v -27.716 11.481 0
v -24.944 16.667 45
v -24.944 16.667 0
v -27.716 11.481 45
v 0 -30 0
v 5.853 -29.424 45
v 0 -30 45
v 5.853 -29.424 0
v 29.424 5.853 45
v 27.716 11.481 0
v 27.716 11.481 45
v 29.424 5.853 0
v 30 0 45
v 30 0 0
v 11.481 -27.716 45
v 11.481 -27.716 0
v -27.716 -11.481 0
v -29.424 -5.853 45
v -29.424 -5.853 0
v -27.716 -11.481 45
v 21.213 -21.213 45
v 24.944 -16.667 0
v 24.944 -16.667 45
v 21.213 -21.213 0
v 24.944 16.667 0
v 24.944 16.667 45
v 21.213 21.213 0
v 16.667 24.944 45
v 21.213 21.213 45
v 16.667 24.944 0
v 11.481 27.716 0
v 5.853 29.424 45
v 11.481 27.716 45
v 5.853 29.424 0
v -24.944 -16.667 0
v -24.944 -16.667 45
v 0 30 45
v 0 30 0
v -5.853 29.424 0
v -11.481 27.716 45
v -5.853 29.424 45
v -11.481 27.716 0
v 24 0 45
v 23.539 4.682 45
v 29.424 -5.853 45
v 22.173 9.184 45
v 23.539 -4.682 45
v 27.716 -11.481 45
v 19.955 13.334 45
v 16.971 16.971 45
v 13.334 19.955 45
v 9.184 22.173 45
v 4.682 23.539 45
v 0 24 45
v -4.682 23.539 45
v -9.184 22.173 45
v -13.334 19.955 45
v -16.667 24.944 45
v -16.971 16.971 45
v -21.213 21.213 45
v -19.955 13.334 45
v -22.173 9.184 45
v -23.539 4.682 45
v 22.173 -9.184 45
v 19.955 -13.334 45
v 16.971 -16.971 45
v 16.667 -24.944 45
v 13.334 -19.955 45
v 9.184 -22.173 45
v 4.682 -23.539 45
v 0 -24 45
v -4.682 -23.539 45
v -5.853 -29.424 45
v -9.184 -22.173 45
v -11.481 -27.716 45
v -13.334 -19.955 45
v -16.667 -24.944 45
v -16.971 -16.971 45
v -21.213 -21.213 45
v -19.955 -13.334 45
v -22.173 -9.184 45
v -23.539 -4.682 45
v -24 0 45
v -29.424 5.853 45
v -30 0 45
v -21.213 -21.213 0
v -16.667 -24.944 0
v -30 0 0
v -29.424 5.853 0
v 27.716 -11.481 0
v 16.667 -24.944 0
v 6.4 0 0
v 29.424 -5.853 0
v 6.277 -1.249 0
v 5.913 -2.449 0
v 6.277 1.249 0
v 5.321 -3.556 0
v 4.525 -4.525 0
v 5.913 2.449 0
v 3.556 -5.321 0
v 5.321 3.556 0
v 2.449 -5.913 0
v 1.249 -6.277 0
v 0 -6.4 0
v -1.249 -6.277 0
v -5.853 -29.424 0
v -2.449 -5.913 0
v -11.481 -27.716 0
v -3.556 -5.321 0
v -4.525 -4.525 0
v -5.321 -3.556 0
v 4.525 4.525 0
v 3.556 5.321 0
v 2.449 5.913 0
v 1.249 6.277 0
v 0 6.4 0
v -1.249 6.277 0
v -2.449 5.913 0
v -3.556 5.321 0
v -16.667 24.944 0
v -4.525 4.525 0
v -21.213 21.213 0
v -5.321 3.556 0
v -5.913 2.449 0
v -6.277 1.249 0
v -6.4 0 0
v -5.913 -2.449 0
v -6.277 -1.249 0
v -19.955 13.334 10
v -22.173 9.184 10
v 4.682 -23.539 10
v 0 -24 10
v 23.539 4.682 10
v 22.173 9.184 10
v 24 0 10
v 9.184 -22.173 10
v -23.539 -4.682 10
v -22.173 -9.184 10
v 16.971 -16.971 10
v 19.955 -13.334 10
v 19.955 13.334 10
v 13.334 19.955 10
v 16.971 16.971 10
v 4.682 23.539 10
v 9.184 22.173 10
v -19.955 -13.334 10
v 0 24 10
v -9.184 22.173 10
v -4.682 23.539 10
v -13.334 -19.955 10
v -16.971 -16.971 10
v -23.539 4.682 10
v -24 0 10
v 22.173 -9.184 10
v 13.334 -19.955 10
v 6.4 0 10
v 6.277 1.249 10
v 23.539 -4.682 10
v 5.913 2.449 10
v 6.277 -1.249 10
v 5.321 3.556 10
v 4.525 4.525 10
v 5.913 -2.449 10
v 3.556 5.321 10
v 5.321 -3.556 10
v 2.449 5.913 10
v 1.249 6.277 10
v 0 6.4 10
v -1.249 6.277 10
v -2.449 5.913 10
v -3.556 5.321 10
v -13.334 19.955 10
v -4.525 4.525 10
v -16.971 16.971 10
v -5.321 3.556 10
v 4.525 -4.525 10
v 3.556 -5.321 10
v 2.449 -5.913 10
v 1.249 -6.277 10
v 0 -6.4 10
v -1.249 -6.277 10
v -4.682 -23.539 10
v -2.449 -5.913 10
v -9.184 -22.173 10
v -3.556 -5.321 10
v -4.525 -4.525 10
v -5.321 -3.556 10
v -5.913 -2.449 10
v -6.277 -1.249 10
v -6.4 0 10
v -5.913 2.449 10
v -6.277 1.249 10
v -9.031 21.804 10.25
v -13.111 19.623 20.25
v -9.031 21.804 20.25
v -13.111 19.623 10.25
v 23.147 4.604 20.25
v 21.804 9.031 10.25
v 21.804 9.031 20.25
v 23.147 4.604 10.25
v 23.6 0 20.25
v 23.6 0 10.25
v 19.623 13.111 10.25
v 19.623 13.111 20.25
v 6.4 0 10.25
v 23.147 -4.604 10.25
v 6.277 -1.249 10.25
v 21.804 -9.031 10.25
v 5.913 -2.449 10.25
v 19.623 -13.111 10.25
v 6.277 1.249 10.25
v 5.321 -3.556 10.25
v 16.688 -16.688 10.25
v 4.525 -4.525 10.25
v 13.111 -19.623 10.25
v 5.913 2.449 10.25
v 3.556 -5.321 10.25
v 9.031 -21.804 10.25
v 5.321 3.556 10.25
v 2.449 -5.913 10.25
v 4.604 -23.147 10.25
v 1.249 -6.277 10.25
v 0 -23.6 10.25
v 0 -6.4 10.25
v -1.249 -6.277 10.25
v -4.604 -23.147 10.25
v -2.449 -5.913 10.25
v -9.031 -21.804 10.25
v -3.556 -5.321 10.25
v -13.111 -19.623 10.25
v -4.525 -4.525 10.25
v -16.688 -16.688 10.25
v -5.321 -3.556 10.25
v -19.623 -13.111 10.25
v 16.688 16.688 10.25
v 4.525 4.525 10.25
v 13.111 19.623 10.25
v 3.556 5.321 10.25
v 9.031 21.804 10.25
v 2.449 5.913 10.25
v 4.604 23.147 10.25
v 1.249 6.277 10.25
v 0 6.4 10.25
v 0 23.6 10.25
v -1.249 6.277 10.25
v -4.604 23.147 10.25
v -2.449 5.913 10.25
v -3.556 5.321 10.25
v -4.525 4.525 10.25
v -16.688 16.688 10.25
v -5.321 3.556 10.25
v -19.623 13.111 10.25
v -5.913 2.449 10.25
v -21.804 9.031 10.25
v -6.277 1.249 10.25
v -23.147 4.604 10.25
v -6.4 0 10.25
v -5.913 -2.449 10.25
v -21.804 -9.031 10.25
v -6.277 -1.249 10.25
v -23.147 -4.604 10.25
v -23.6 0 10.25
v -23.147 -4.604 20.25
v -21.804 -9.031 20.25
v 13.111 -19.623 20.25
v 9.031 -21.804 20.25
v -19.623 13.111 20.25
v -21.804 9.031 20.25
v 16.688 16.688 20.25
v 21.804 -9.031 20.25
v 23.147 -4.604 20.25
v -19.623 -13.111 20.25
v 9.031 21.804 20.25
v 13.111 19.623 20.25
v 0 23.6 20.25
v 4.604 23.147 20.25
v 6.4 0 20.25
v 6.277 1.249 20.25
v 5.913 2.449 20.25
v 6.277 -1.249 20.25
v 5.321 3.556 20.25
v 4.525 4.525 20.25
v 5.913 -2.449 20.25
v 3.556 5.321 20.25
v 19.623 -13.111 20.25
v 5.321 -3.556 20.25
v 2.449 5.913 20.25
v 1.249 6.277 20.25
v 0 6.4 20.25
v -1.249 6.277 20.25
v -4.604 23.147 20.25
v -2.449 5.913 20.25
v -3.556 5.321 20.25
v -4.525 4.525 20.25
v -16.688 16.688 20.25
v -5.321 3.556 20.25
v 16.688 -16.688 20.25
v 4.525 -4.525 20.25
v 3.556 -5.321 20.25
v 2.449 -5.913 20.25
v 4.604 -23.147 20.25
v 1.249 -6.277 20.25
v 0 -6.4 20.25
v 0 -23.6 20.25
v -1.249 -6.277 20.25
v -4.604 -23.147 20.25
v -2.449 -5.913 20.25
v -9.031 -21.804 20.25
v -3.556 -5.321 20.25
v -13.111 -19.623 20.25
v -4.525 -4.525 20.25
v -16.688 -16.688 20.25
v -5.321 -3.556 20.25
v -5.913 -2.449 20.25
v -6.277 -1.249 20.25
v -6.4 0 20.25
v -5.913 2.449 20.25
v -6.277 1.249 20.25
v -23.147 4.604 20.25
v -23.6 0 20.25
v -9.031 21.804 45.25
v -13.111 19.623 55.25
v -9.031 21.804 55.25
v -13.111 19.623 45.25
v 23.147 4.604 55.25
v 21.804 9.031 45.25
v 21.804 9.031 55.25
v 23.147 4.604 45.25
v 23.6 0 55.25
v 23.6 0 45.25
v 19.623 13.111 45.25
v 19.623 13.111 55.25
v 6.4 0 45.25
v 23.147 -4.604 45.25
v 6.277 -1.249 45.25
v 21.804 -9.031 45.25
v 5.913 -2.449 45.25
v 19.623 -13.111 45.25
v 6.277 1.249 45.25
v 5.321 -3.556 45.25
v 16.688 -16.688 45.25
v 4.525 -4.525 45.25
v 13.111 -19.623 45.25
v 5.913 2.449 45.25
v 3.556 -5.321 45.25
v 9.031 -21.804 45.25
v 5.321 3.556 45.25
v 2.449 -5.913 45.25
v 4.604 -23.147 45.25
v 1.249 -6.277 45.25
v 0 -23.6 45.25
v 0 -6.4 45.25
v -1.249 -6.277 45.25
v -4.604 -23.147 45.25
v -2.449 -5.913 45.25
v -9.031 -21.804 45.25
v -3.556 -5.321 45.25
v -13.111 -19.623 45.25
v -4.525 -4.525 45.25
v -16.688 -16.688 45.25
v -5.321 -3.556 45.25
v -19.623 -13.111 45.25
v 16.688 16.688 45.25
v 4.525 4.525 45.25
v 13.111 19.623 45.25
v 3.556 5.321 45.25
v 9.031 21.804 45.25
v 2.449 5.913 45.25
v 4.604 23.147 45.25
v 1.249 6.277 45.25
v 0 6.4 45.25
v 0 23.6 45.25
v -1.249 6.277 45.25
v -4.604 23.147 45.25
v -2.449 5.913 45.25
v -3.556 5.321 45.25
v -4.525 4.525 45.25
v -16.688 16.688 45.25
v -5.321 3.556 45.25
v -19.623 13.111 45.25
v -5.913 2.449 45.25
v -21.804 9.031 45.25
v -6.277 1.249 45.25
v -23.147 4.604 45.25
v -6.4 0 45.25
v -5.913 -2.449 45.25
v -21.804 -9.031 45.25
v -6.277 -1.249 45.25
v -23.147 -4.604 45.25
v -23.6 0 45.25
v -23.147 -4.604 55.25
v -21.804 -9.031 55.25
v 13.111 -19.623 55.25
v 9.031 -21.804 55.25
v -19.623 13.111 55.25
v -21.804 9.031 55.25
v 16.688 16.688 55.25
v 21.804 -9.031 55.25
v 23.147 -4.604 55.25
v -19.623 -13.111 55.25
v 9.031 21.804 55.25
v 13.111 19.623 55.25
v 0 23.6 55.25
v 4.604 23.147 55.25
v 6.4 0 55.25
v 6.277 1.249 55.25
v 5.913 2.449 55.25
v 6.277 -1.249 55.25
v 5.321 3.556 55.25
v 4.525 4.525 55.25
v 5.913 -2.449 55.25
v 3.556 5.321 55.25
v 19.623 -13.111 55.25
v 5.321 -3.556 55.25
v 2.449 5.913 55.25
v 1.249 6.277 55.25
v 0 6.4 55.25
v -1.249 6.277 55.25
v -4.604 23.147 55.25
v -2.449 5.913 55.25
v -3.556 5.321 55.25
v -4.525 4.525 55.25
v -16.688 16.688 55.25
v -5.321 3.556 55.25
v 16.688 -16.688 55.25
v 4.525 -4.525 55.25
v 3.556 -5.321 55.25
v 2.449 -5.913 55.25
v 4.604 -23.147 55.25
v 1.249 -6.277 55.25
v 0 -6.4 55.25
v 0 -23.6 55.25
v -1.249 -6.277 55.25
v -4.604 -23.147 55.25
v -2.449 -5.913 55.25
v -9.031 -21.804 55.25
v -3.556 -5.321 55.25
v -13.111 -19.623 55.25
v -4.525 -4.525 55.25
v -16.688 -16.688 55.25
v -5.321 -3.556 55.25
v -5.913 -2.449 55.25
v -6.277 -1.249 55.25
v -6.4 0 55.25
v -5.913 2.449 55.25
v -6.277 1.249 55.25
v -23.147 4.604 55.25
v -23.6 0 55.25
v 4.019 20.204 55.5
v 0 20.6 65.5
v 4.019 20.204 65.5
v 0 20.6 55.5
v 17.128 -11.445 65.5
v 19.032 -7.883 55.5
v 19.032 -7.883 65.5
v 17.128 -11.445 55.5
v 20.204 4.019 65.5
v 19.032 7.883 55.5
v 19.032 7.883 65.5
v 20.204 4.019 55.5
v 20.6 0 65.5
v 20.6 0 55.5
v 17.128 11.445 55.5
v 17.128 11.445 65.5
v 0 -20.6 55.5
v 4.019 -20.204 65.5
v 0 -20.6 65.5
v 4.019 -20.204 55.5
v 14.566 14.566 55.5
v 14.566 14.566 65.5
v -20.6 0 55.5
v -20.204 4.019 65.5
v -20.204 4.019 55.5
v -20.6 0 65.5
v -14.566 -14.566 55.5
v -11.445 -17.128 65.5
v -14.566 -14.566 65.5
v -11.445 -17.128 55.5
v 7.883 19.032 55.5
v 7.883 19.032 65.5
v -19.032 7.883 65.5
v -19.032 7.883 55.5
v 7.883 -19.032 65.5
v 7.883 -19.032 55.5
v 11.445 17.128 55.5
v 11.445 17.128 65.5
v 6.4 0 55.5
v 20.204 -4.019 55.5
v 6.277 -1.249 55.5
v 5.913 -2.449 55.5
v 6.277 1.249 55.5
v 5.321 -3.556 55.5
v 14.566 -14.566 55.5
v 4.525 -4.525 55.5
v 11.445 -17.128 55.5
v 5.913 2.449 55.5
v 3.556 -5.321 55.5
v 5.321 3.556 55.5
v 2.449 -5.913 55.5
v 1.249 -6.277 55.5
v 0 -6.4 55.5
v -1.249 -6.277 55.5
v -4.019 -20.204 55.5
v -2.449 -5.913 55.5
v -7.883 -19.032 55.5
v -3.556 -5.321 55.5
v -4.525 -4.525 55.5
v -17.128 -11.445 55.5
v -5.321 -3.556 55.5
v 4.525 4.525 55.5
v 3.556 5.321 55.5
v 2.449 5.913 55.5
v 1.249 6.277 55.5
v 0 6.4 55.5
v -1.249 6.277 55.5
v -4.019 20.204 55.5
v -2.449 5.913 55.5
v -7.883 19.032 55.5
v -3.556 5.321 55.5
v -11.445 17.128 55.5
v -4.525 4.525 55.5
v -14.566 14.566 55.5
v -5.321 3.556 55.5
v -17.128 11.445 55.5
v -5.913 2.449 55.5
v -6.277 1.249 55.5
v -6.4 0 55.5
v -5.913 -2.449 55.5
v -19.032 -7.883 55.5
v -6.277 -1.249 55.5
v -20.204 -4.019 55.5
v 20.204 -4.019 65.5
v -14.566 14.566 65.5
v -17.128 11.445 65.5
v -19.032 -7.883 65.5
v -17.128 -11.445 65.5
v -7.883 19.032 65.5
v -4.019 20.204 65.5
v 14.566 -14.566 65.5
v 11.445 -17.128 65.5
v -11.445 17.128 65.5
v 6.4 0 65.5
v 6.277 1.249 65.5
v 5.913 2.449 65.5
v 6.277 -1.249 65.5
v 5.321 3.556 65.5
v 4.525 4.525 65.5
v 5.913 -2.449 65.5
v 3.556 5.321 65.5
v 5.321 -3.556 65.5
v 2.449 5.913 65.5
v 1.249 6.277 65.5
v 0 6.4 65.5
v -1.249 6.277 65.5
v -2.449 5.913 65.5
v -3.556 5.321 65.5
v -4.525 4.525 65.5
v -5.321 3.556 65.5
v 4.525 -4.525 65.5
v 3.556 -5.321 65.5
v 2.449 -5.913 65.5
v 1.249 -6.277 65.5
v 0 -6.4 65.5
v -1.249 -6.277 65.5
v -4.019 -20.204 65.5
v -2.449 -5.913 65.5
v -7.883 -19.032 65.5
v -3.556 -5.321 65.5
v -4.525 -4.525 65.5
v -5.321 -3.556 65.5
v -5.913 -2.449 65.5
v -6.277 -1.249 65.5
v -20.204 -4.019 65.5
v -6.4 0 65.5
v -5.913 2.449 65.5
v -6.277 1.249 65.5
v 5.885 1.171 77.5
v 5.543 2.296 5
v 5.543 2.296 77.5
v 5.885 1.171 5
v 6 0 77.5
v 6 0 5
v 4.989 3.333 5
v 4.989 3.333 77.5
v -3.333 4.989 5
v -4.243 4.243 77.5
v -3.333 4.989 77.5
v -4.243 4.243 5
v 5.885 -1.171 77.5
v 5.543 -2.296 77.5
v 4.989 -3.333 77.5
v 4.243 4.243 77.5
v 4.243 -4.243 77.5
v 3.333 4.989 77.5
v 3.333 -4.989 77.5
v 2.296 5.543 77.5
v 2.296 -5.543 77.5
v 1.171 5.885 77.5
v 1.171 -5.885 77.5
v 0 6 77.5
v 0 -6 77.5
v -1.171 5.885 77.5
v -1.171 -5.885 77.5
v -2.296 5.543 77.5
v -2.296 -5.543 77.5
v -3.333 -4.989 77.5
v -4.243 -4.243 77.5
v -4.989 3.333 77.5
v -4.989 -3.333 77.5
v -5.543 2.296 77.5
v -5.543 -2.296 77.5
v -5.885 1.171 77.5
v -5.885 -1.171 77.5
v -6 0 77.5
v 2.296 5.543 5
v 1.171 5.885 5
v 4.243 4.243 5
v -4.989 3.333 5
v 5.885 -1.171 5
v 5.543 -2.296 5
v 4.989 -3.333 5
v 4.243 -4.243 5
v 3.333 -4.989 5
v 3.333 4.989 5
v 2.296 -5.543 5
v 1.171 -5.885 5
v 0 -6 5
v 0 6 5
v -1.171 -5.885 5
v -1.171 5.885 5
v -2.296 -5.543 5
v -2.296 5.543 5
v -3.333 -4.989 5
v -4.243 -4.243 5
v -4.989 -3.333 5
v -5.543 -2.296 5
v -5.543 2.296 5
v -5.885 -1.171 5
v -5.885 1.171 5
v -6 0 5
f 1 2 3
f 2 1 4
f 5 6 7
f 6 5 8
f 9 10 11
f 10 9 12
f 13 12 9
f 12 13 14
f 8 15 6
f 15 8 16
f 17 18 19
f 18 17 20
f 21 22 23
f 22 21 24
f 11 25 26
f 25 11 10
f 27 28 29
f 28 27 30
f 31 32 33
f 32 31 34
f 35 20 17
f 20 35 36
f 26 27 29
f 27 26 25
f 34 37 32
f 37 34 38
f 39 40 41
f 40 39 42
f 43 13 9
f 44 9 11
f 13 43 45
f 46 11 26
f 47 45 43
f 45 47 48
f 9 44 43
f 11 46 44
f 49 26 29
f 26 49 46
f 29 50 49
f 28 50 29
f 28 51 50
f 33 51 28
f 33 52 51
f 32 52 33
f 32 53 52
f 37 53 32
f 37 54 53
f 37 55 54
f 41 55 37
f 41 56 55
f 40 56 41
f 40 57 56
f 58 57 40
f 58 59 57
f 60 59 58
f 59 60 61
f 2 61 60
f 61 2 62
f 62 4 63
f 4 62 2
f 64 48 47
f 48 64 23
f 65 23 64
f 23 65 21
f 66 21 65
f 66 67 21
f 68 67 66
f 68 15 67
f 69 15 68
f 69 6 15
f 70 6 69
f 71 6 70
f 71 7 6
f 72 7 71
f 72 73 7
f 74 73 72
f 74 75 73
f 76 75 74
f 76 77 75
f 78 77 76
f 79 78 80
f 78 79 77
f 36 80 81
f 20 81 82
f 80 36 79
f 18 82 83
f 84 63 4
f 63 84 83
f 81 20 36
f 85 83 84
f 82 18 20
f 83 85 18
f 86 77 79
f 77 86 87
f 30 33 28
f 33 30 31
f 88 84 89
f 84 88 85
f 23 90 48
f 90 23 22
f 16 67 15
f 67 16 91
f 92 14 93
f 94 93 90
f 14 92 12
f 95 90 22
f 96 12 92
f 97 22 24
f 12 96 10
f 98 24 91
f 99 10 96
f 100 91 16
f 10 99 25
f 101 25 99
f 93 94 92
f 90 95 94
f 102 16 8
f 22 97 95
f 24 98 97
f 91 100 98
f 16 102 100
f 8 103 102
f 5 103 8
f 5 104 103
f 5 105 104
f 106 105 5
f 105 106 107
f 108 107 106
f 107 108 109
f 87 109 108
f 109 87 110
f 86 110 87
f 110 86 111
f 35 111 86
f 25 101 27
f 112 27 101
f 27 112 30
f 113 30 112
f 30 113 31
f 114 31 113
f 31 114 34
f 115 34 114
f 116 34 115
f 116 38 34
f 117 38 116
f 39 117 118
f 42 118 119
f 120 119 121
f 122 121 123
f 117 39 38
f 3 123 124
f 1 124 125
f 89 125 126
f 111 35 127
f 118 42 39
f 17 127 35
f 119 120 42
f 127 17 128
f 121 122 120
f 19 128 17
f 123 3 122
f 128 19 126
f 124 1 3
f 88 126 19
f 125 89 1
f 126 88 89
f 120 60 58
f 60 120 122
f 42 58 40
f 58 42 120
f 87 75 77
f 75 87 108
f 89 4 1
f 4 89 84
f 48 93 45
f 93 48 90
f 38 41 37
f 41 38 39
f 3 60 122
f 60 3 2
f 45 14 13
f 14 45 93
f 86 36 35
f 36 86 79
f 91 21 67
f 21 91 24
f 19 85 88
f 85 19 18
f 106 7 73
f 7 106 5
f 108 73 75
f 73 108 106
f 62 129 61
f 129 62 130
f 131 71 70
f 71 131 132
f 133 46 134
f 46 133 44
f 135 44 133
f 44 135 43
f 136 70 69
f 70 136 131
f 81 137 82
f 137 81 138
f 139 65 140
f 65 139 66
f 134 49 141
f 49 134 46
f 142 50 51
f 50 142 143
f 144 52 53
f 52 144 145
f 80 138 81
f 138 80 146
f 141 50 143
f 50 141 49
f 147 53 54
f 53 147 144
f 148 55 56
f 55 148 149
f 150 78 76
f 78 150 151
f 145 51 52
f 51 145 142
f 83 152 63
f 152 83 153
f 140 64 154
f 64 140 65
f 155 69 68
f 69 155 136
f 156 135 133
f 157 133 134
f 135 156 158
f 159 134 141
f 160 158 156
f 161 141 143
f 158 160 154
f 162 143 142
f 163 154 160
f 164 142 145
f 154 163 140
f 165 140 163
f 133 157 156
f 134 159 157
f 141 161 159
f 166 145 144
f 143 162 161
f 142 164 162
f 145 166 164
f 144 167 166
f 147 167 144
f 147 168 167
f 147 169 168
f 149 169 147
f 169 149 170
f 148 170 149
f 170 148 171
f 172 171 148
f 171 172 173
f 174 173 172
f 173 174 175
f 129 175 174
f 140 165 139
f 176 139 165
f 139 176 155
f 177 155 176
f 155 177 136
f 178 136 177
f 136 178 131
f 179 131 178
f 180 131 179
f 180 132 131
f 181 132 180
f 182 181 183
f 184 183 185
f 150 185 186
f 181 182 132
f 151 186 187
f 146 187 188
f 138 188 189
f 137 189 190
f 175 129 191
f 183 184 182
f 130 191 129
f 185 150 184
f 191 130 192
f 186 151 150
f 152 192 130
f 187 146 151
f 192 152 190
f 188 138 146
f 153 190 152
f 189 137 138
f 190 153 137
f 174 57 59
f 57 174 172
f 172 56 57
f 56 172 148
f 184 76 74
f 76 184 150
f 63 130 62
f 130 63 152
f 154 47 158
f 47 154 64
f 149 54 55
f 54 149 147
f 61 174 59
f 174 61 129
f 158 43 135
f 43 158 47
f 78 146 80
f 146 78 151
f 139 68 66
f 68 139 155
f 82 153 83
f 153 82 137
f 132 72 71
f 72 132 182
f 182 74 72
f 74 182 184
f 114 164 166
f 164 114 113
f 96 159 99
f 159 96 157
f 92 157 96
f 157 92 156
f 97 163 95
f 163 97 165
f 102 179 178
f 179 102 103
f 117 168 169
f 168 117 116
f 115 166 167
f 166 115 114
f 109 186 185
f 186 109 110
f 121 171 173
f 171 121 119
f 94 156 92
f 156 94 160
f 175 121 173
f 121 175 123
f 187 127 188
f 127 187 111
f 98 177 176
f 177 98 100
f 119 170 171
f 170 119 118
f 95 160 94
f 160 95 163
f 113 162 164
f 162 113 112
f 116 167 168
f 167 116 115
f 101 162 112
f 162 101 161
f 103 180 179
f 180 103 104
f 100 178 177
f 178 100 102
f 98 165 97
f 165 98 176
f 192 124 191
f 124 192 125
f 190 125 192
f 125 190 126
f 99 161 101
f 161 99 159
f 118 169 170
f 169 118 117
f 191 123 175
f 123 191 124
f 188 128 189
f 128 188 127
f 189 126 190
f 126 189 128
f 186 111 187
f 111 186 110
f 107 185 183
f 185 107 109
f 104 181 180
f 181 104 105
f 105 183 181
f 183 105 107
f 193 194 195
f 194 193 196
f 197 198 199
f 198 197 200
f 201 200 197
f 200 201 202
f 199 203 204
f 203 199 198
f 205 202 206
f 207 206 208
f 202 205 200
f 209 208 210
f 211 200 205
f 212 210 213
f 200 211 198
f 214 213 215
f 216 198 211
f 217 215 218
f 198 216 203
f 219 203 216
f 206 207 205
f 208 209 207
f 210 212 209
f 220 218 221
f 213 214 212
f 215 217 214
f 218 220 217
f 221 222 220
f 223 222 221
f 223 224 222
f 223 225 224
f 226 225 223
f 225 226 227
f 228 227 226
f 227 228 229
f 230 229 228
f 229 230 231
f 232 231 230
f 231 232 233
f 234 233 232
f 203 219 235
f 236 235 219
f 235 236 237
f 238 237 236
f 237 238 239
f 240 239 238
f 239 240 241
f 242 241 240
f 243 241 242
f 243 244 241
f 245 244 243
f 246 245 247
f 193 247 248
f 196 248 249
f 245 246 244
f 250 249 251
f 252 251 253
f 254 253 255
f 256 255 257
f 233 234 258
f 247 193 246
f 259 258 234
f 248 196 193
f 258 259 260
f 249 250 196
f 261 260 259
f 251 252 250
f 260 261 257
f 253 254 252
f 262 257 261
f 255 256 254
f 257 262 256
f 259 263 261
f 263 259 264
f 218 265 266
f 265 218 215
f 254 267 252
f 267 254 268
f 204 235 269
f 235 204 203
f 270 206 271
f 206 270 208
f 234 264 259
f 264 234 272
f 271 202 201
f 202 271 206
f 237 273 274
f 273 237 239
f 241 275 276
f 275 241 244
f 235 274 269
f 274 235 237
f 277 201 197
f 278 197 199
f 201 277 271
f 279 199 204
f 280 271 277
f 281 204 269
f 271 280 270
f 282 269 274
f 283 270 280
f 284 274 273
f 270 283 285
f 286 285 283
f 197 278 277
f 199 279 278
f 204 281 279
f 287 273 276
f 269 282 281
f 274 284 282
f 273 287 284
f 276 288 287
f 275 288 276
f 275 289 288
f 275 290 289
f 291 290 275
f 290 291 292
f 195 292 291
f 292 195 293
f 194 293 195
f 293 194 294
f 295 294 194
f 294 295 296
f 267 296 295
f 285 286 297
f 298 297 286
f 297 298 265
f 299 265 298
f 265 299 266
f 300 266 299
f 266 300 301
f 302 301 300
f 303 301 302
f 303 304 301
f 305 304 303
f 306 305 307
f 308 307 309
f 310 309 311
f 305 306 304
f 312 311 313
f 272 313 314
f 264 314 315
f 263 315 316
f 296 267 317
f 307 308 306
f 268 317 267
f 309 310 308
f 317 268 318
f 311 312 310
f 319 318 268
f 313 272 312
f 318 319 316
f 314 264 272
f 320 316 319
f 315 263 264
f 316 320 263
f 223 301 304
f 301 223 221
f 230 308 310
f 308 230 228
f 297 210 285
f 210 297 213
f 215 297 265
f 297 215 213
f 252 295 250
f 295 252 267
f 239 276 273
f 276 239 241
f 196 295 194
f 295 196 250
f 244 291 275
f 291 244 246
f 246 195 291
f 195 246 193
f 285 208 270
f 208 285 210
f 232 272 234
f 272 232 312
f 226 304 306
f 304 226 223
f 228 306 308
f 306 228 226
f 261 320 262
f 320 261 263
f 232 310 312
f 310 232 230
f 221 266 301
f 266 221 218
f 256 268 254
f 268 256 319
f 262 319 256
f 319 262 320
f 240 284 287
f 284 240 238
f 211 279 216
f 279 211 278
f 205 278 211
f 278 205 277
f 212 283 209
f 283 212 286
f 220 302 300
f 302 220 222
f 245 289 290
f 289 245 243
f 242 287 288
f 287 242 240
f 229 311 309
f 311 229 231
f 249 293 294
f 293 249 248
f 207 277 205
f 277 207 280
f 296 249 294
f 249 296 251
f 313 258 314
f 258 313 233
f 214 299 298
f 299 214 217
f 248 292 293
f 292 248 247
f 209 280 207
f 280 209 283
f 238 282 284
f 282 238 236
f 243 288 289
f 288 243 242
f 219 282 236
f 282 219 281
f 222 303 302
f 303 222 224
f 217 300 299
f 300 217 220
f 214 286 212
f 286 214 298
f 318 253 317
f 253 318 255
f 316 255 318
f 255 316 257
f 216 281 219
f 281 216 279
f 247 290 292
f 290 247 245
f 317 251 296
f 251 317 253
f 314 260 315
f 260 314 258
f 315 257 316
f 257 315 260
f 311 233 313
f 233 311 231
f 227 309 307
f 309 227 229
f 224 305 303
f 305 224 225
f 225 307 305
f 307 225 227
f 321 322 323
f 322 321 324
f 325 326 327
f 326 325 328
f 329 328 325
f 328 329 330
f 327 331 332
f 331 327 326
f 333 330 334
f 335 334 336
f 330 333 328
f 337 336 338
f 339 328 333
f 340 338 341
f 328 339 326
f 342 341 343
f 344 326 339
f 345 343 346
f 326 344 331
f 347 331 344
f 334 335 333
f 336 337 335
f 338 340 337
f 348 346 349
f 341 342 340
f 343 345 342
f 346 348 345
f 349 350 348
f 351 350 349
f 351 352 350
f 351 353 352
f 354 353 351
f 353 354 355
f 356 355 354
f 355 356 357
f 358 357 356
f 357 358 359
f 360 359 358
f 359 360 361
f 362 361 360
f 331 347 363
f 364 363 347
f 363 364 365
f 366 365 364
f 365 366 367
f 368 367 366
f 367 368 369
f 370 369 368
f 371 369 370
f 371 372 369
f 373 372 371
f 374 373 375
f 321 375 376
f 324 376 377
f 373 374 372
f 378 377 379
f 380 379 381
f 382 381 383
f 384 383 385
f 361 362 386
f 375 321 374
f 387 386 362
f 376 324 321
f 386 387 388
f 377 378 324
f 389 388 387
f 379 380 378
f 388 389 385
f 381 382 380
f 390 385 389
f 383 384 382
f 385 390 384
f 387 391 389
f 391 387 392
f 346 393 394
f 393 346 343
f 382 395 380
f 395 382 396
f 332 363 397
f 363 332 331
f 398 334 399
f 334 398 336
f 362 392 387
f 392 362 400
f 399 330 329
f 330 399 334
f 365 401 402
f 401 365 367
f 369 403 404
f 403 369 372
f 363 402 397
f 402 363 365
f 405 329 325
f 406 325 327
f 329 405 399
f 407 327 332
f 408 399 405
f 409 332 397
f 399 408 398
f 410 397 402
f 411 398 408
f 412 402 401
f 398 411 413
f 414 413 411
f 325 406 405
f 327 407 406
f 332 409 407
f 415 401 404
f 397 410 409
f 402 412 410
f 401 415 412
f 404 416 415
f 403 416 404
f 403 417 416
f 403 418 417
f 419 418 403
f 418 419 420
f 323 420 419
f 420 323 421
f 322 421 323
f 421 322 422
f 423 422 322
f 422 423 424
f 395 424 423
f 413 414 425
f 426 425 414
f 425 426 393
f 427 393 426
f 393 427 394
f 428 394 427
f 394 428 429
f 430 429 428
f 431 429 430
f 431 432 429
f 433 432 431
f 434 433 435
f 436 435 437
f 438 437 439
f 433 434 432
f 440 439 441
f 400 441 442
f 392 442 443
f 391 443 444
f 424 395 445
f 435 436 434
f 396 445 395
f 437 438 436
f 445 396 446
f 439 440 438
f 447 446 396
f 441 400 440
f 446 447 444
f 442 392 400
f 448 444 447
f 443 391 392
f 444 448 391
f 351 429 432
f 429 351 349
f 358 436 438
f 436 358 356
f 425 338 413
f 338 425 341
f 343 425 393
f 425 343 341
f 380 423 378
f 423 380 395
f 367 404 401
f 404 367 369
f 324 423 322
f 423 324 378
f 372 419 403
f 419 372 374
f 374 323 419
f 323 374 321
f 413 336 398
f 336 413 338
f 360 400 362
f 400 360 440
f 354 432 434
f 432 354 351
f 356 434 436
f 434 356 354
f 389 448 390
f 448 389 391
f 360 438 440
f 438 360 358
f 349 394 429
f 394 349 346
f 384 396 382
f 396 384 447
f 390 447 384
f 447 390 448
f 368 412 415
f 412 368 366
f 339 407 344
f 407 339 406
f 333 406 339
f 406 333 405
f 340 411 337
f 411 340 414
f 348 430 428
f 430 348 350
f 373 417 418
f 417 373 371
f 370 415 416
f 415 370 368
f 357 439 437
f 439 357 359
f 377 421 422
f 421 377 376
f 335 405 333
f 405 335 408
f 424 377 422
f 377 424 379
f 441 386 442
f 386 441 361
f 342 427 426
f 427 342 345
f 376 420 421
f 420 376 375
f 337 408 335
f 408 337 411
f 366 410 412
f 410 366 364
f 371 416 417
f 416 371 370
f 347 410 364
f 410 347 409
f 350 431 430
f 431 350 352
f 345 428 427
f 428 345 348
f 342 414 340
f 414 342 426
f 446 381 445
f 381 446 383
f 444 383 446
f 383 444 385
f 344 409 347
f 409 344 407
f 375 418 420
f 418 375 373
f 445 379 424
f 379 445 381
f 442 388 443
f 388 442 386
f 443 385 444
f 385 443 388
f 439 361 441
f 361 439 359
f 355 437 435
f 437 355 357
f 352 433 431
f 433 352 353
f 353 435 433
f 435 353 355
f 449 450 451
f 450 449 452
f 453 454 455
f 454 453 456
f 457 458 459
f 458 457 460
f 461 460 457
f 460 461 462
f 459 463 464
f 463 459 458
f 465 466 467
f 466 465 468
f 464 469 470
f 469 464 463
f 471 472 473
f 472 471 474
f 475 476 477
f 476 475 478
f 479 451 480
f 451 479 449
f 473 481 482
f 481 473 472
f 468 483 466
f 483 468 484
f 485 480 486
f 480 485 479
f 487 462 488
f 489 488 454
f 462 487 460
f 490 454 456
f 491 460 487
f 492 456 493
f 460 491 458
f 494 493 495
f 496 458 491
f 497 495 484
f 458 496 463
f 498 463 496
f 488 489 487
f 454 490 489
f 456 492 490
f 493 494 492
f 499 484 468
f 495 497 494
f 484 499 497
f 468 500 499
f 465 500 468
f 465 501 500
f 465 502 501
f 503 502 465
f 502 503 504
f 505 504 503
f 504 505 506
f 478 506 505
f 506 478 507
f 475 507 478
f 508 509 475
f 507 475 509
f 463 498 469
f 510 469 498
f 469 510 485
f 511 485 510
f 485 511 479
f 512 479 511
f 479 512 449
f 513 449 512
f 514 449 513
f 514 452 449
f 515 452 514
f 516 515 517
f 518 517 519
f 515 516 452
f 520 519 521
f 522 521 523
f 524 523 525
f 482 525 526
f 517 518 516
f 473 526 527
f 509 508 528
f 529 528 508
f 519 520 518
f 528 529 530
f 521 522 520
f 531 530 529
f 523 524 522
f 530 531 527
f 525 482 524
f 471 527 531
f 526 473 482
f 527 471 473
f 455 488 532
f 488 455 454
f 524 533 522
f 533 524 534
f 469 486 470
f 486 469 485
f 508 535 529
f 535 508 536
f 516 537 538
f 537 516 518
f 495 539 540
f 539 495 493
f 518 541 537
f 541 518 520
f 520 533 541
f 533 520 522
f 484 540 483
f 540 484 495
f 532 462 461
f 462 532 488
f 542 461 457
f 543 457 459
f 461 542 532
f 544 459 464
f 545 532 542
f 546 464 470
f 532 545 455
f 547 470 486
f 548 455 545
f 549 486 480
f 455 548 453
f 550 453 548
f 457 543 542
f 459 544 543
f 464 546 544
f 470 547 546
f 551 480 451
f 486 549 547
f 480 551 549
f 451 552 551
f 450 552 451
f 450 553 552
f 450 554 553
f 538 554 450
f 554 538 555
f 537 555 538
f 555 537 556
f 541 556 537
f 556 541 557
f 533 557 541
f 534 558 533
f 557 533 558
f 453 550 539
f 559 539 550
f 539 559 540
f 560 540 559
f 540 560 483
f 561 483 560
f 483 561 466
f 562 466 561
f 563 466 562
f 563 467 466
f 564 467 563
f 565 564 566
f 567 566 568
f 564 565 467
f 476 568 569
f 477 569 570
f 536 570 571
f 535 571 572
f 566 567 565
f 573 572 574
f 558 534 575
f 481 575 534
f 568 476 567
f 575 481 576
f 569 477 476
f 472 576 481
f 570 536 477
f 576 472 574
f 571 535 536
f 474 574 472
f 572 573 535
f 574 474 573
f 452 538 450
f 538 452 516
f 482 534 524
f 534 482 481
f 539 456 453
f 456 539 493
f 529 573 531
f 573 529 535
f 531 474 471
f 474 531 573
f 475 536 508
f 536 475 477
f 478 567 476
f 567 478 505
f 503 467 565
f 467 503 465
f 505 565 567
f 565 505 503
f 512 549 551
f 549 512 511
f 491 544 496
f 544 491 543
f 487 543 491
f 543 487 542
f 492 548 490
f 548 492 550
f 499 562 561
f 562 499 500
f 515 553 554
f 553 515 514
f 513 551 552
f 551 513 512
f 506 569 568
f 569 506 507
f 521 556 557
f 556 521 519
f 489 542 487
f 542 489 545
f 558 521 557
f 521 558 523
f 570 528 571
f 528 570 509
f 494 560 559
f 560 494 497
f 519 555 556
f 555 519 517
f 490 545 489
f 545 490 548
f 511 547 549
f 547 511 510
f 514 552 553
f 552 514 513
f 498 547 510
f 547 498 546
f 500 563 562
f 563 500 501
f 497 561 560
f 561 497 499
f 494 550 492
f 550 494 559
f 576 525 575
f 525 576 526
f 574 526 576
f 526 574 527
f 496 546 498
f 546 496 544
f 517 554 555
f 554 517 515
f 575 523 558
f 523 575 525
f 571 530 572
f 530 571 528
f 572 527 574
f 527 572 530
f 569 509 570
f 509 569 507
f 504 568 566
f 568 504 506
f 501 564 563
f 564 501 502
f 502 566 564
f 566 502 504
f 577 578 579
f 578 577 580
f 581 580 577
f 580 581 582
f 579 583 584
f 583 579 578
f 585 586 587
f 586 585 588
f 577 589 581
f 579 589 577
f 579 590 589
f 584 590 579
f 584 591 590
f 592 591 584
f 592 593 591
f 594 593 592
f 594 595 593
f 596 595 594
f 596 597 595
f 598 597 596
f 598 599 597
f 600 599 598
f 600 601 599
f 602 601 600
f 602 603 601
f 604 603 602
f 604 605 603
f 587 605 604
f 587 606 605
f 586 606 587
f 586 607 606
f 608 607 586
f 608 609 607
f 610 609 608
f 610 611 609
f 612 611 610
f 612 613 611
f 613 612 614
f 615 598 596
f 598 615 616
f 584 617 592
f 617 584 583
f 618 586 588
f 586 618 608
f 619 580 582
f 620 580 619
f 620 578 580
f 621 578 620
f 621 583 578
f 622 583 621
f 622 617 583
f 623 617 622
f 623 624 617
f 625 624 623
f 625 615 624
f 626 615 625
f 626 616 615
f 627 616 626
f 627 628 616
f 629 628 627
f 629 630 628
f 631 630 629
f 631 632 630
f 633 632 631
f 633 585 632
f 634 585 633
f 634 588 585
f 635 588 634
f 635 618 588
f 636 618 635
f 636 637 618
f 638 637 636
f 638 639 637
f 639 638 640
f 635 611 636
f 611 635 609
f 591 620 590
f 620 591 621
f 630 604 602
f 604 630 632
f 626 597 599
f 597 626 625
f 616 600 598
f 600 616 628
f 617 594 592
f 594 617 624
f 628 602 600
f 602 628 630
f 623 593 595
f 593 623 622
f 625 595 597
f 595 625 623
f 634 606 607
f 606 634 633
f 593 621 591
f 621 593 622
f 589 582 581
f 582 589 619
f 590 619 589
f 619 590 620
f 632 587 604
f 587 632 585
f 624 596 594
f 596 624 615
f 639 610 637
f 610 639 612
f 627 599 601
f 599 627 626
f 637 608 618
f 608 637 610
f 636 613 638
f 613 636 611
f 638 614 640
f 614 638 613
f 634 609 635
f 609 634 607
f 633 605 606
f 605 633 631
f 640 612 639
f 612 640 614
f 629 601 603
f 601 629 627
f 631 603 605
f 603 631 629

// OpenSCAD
$fn = 32;

// ------------------------------------------------------------------------
// Bearing housing: housing d60, two bearings and a shaft
// Every part is its own module, assembly() places them once.
// ------------------------------------------------------------------------

// --- part 1 ---
module housing() {
  difference() {
    cylinder(h = 45, d = 60);
    translate([0, 0, 10]) cylinder(h = 36, d = 48);
    translate([0, 0, -1]) cylinder(h = 12, d = 12.8);
  }
}

// --- part 2 ---
module bearing_lower() {
  difference() {
      translate([0, 0, 0]) cylinder(h = 10, d = 47.2);
      translate([0, 0, -1]) cylinder(h = 12, d = 12.8);
    }
}

// --- part 3 ---
module bearing_upper() {
  difference() {
      translate([0, 0, 0]) cylinder(h = 10, d = 47.2);
      translate([0, 0, -1]) cylinder(h = 12, d = 12.8);
    }
}

// --- part 4 ---
module spacer() {
  difference() {
      translate([0, 0, 0]) cylinder(h = 10, d = 41.2);
      translate([0, 0, -1]) cylinder(h = 12, d = 12.8);
    }
}

// --- part 5 ---
module shaft() {
  translate([0, 0, -36.25]) cylinder(h = 72.5, d = 12);
}

// --- assembly ---
module assembly() {
  translate([0, 0, 0]) rotate([0, 0, 0]) housing();
  translate([0, 0, 10.25]) rotate([0, 0, 0]) bearing_lower();
  translate([0, 0, 45.25]) rotate([0, 0, 0]) bearing_upper();
  translate([0, 0, 55.5]) rotate([0, 0, 0]) spacer();
  translate([0, 0, 41.25]) rotate([0, 0, 0]) shaft();
}

assembly();
